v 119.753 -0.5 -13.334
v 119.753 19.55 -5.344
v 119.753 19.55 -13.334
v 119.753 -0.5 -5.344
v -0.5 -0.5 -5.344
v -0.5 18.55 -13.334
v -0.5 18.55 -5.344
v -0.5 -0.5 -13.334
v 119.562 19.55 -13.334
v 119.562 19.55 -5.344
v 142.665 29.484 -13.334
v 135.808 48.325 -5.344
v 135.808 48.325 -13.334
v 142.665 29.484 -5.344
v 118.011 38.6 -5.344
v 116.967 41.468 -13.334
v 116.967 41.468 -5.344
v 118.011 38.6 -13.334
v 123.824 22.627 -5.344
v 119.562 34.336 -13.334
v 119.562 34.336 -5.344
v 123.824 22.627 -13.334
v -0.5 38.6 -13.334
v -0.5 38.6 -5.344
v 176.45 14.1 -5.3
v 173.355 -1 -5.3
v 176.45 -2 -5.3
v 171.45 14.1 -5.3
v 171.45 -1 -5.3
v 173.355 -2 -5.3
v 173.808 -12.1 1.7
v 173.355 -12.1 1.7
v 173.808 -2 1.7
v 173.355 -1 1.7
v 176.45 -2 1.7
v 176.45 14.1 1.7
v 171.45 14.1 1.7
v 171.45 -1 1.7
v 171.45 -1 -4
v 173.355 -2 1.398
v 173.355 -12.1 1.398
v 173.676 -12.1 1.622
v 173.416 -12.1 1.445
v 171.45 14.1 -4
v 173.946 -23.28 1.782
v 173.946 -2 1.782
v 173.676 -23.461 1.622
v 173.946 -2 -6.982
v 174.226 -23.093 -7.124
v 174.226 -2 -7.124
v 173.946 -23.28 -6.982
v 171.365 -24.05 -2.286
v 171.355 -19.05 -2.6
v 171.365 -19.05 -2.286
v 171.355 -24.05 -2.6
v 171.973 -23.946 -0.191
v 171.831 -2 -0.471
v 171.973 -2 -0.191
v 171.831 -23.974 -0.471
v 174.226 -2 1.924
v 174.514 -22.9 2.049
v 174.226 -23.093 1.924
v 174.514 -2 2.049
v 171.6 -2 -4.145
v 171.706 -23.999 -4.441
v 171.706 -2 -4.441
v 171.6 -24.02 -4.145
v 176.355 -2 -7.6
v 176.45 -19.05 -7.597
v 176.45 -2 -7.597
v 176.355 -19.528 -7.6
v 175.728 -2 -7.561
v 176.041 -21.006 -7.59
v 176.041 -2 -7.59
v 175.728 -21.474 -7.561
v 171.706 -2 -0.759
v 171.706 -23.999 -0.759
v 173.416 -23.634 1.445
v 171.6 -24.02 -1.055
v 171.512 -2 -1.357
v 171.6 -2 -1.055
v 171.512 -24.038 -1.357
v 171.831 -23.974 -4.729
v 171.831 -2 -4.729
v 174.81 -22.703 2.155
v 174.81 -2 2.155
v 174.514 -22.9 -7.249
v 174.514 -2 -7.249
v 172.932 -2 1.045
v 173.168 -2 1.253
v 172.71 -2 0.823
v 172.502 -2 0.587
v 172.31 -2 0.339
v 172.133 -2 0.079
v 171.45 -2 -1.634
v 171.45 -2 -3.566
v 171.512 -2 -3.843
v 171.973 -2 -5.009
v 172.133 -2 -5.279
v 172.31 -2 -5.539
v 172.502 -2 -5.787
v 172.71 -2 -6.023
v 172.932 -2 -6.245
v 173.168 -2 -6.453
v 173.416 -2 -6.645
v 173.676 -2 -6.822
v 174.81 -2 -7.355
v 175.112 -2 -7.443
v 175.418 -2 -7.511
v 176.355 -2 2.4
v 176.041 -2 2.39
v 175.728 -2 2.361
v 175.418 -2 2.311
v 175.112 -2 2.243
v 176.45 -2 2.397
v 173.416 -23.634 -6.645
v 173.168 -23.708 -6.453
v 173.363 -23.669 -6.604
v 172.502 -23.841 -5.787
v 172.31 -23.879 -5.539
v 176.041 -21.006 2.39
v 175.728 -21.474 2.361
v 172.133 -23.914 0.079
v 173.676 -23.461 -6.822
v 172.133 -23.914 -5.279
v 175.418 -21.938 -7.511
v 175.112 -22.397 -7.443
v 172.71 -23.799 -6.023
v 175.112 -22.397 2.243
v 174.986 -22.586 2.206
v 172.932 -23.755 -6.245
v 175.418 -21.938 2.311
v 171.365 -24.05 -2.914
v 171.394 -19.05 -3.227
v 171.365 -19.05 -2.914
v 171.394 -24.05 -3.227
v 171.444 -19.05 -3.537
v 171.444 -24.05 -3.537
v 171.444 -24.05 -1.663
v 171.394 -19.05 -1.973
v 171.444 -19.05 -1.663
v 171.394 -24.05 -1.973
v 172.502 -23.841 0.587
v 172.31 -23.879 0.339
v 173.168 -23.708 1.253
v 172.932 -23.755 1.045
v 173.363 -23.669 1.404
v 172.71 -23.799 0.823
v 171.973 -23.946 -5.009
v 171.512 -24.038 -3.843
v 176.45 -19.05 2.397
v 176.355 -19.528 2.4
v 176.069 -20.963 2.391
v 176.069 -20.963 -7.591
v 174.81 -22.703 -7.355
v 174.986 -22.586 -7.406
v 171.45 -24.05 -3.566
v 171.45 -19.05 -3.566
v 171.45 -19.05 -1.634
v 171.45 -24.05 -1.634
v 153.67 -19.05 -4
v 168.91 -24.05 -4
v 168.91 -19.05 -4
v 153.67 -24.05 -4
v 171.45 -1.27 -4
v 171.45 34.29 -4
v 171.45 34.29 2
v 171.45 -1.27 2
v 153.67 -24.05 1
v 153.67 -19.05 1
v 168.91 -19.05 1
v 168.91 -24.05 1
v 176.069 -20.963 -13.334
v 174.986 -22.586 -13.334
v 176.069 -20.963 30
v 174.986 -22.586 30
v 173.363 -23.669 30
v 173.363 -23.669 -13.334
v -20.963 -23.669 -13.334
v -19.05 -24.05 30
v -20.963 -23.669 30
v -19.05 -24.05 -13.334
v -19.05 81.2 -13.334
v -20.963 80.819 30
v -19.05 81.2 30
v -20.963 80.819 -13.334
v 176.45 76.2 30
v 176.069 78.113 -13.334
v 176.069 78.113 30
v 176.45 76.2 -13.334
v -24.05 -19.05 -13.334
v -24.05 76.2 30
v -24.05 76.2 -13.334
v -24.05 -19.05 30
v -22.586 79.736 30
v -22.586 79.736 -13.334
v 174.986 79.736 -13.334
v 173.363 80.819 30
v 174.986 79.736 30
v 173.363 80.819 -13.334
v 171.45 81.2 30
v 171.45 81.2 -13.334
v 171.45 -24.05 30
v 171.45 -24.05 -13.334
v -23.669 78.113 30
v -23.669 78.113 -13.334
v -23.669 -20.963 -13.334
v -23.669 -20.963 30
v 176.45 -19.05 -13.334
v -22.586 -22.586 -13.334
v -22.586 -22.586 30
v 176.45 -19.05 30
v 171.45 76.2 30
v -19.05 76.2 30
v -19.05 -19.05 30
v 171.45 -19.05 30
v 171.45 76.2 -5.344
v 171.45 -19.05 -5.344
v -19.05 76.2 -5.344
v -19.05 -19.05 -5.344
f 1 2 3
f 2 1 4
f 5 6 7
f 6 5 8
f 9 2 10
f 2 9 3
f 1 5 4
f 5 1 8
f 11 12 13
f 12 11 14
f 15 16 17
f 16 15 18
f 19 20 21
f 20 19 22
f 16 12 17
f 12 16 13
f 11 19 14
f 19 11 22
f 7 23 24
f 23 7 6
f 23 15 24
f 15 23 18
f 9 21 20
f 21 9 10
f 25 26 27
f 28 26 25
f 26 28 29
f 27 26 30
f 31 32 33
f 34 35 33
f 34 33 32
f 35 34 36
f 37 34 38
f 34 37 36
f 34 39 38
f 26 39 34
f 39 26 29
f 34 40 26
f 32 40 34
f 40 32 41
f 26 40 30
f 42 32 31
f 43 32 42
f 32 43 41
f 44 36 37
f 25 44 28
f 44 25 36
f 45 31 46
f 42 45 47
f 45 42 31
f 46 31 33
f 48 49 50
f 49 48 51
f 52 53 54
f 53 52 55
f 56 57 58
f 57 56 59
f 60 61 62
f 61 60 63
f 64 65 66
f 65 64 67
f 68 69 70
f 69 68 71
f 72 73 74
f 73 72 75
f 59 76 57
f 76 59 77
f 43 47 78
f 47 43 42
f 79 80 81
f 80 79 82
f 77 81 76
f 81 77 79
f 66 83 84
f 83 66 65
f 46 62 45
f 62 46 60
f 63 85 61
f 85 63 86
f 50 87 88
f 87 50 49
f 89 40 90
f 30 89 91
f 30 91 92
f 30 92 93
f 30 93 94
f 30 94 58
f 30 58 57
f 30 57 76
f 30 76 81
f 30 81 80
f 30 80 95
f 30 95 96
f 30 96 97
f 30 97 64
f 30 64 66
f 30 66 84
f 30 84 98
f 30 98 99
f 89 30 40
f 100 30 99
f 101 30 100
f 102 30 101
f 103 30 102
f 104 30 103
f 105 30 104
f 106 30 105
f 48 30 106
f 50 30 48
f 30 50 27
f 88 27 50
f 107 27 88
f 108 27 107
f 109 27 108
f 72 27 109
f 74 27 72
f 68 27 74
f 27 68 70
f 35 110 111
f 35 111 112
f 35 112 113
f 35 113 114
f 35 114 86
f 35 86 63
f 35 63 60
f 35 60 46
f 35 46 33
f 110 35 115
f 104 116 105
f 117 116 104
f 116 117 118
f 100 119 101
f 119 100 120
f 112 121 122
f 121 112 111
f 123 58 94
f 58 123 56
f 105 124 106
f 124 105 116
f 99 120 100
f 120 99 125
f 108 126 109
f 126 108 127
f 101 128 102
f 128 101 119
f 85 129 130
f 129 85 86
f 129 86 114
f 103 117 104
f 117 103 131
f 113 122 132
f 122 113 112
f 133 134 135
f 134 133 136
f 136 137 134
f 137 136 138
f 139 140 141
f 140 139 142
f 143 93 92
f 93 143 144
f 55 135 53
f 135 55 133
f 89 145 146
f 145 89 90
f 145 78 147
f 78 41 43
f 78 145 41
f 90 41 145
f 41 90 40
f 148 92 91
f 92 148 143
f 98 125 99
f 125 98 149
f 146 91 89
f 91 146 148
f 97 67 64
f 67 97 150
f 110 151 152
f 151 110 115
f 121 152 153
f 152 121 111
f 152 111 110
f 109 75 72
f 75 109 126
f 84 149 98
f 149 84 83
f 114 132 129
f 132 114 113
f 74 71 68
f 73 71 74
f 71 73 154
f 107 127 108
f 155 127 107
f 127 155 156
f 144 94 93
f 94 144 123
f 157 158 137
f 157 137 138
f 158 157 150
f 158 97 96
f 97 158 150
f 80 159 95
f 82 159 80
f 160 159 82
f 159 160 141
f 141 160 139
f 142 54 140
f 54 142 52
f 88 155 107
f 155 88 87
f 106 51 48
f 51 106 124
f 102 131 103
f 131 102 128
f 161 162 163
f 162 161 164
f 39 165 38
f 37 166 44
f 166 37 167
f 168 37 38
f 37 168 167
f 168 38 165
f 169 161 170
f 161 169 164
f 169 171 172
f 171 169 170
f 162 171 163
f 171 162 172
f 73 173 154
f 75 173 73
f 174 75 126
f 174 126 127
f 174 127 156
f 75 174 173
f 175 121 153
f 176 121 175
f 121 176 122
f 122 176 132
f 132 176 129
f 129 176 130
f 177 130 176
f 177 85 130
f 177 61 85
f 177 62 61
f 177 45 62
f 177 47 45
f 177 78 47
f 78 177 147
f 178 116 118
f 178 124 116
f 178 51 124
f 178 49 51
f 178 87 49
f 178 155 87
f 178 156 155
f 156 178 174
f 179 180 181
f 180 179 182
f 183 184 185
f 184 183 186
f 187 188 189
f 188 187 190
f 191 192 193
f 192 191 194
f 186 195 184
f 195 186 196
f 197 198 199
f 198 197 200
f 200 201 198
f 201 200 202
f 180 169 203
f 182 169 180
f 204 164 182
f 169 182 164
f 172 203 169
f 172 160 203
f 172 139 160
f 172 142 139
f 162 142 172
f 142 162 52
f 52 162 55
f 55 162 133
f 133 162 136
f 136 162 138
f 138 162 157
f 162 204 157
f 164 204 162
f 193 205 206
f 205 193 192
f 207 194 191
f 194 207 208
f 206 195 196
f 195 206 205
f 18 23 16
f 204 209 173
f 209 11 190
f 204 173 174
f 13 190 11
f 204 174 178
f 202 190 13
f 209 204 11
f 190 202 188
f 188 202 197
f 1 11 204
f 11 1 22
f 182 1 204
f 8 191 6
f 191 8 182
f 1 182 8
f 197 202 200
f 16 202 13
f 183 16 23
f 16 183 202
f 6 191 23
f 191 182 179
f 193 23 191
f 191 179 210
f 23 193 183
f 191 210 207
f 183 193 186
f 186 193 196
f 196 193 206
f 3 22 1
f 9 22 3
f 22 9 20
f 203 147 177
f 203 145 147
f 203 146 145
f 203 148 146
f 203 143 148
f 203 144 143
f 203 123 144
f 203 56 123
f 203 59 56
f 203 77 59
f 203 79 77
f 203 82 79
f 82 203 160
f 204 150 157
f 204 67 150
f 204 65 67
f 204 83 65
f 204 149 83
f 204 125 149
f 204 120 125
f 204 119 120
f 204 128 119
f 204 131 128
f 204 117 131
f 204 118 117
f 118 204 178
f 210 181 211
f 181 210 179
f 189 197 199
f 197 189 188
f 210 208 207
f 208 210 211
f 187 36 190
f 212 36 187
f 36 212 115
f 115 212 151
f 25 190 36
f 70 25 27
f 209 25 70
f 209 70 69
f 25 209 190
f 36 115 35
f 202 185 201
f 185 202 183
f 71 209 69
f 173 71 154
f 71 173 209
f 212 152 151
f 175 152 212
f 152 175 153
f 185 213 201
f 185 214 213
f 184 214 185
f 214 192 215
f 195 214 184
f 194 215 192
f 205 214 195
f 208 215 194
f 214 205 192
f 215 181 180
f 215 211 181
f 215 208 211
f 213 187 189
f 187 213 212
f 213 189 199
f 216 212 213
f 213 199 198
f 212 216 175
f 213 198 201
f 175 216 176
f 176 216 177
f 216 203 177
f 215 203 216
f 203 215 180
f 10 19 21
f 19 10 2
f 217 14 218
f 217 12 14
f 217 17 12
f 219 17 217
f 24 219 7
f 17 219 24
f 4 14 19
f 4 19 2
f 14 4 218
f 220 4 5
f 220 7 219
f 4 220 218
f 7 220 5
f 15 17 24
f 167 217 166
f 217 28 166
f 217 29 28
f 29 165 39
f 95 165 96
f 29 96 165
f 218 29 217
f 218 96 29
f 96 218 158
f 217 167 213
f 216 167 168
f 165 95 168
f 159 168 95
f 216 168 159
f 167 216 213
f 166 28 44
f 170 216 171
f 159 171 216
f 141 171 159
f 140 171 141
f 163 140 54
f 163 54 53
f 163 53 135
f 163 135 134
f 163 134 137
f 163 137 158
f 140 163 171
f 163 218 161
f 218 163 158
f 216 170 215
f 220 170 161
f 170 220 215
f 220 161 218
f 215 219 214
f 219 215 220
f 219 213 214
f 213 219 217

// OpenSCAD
// file: ../../../lib/circuits/helpers.scad
function bu(u) = u * 2.54;

module breadboard_row(number, orientation="vertical") {
  children();
  if(number > 1) {
    if(orientation == "vertical") {
      translate([0,bu(1),0])
        breadboard_row(number-1, orientation=orientation) {
          children();
        }
    } else {
      translate([bu(1),0,0])
        breadboard_row(number-1, orientation=orientation){
          children();
        }
    }
  }
}
// file: ../../../lib/switches/rgb.scad
include <../variables.scad>

module rgb_row_trace_connection(width, height, xpos, ypos, rgb, connections) {
  half_width = u_mm(width)/2;
  half_height = u_mm(height)/2;
  if(connections[3] == "connect") {
    translate([1-half_width,8.875,0]){
      circle(d=0.8,$fn=40);
      offset(0.4)
        polygon(points=[[0,-0.01],[0,0.01],[u_mm(-xpos)-2, u_mm(-ypos)+0.01],[u_mm(-xpos)-2, u_mm(-ypos)-0.01]]);
    }
    translate([1-half_width,4.9,0]){
      circle(d=0.8,$fn=40);
      offset(0.4)
        polygon(points=[[0,-0.01],[0,0.01],[u_mm(-xpos)-2, u_mm(-ypos)+0.01],[u_mm(-xpos)-2, u_mm(-ypos)-0.01]]);
    }
    translate([1-half_width,3.3,0]){
      circle(d=0.8,$fn=40);
      offset(0.4)
        polygon(points=[[0,-0.01],[0,0.01],[u_mm(-xpos)-2, u_mm(-ypos)+0.01],[u_mm(-xpos)-2, u_mm(-ypos)-0.01]]);
    }
  }
  if(connections[2] == "connect") {
    translate([half_width-1,8.875,0]) {
      circle(d=0.8,$fn=40);
    }
    translate([half_width-1,4.9,0]) {
      circle(d=0.8,$fn=40);
    }
    translate([half_width-1,3.3,0]){
      circle(d=0.8,$fn=40);
    }
  }
}

module rgb_pcb_drill(width=1, height=1, rgb=true, connections=["hole","hole","hole","hole"]) {
  half_width = u_mm(width)/2;
  half_height = u_mm(height)/2;
  translate([half_width,half_height,0]) {
    if(rgb == true) {
      // LED Hole
      translate([-1.875,3.4])
        square([3.75,3]);

      // LED D
      if(connections[3] == "hole")
        translate([1.3-half_width,8,0])
          circle(d=1,$fn=40);
      if(connections[2] == "hole")
        translate([half_width-1.3,8,0])
          circle(d=1,$fn=40);

      // LED G
      if(connections[3] == "hole")
        translate([1.3-half_width,5.4,0])
          circle(d=1,$fn=40);
      if(connections[2] == "hole")
        translate([half_width-1.3,5.4,0])
          circle(d=1,$fn=40);

      // LED V
      if(connections[3] == "hole")
        translate([1.3-half_width,2.8,0])
          circle(d=1,$fn=40);
      if(connections[2] == "hole")
        translate([half_width-1.3,2.8,0])
          circle(d=1,$fn=40);
    }

    children();
  }
}

module rgb_pcb_hole_traces(width=1, height=1, rgb=true, xpos=0, ypos=0, connections=["hole","hole","hole","hole"]) {
  half_width = u_mm(width)/2;
  half_height = u_mm(height)/2;
  translate([half_width,half_height,0]) {
    if(rgb == true) {
      // LED D
      if(connections[3] == "hole")
        translate([1.3-half_width,8,0])
          circle(d=2.5,$fn=40);
      if(connections[2] == "hole")
        translate([half_width-1.3,8,0])
          circle(d=2.5,$fn=40);

      // LED G
      if(connections[3] == "hole")
        translate([1.3-half_width,5.4,0])
          circle(d=2.5,$fn=40);
      if(connections[2] == "hole")
        translate([half_width-1.3,5.4,0])
          circle(d=2.5,$fn=40);

      // LED V
      if(connections[3] == "hole")
        translate([1.3-half_width,2.8,0])
          circle(d=2.5,$fn=40);
      if(connections[2] == "hole")
        translate([half_width-1.3,2.8,0])
          circle(d=2.5,$fn=40);
    }

    children();
  }
}

module rgb_pcb_traces(width=1, height=1, rgb=true, xpos=0, ypos=0, connections=["hole","hole","hole","hole"]) {
  half_width = u_mm(width)/2;
  half_height = u_mm(height)/2;
  rgb_pcb_hole_traces(width=width, height=height, rgb=rgb, connections=connections) {
    if(rgb == true) {
      rgb_row_trace_connection(width=width, height=height, xpos=xpos, ypos=ypos, rgb=rgb, connections=connections);
      v_left = connections[3] == "none" ? 1 : half_width-5;
      // LED G
      translate([1.25,5])
        square([2,2]);
      translate([2.7,8.5,0]) {
        length = connections[2] == "none" ? 2 : half_width-3.7; 
        square([length,0.75]);
      }
      translate([2.7,6.8])
        square([0.8,2.4]);
      translate([-3.5,6.2])
        square([7,0.8]);
      translate([-3.5,6.8])
        square([0.8,2.4]);
      translate([-4-v_left,8.5,0])
        square([v_left+1,0.75]);

      // LED D
      translate([-4-v_left,4.5,0])
        square([v_left,0.8]);
      translate([-4.5,4.5,0])
        square([0.8,1.3]);
      translate([-4.5,5,0])
        square([1.3,0.8]);
      translate([2,4,0])
        square([2,0.8]);
      translate([4,4,0])
        square([0.8,1.3]);
      translate([4,4.5,0]) {
        length = connections[2] == "none" ? 0 : half_width-5; 
        square([length,0.75]);
      }
      translate([-3.375,5])
        square([2,1.1]);
      translate([1.25,3.75])
        square([2,1.1]);

      // LED V
      v_right = connections[2] == "none" ? 0 : half_width-5.25;
      translate([-4-v_left,2.9,0])
        square([v_right+v_left+8.875,0.8]);
      translate([-3.375,3.5])
        square([2,1.35]);
    }

    children();
  }
}
// file: ../../../lib/switches/base.scad
include <../variables.scad>
include <rgb.scad>

// ["top", "bottom", "left", "right"]

module switch_row_trace_connection(width, height, xpos, ypos, rgb, connections) {
  half_width = u_mm(width)/2;
  half_height = u_mm(height)/2;
  if(connections[3] == "connect") {
    translate([1-half_width,-5.5,0]){
      circle(d=0.8,$fn=40);
      offset(0.4)
        polygon(points=[[0,-0.01],[0,0.01],[u_mm(-xpos)-2, u_mm(-ypos)+0.01],[u_mm(-xpos)-2, u_mm(-ypos)-0.01]]);
    }
  }
  if(connections[2] == "connect") {
    translate([half_width-1,-5.5,0]) {
      circle(d=0.8,$fn=40);
    }
  }
}

module switch_column_trace_connection(width, height, xpos, ypos, rgb, connections, last_xpos=0, last_ypos=0) {
  half_width = u_mm(width)/2;
  half_height = u_mm(height)/2;
  if(connections[1] == "connect") {
    translate([-u_mm((width-1)/2)-0.9,half_height-1,0]) {
      circle(d=0.8,$fn=40);
      offset(0.4)
        polygon(points=[[0,-0.01],[0,0.01],[u_mm((width-1)/2),0.01],[u_mm((width-1)/2),-0.01]]);
    }
  }
  if(connections[0] == "connect") {
    y_off = u_mm(ypos-last_ypos);
    x_off = u_mm(last_xpos-xpos);
    translate([-0.875,-1-y_off-half_height,0]) {
      offset(0.4)
        polygon(points=[[-0.01+x_off,0],[0.01+x_off,0],[0.01,2+y_off],[-0.01,2+y_off]]);
      translate([x_off-0.01,0]) {
        offset(0.4)
          polygon(points=[[0,-0.01],[0,0.01],[u_mm((width-1)/2)+1,0.01],[u_mm((width-1)/2)+1,-0.01]]);
      }
    }
  }
}

module switch_base_pcb_drill(width=1, height=1, rgb=true, single=true, connections=["hole","hole","hole","hole"]) {
  half_width = u_mm(width)/2;
  half_height = u_mm(height)/2;
  rgb_pcb_drill(width=width, height=height, rgb=rgb, connections=connections) {
    // Row
    if(connections[2] == "hole")
      translate([half_width-1.3,-5.5,0])
        circle(d=1,$fn=40);
    if(connections[3] == "hole")
      translate([1.3-half_width,-5.5,0])
        circle(d=1,$fn=40);

    // Column
    if(connections[1] == "hole")
      translate([-1,half_height-1.25,0])
        circle(d=1,$fn=40);
    if(connections[0] == "hole")
      translate([-1,1.25-half_height,0])
        circle(d=1,$fn=40);

    children();
  }
}

module switch_base_pcb_traces(width=1, height=1, rgb=true, xpos=0, ypos=0, connections=["hole","hole","hole","hole"], last_xpos=0, last_ypos=0, single=true) {
  half_width = u_mm(width)/2;
  half_height = u_mm(height)/2;
  rgb_pcb_traces(width=width, height=height, rgb=rgb, xpos=xpos, ypos=ypos, connections=connections) {
    switch_row_trace_connection(width, height, xpos, ypos, rgb, connections);
    if(single && !rgb)
      switch_column_trace_connection(width, height, xpos, ypos, rgb, connections, last_xpos=last_xpos, last_ypos=last_ypos);

    // Row
    if(connections[2] == "hole")
      translate([half_width-1.3,-5.5,0])
        circle(d=2.5,$fn=40);
    if(connections[3] == "hole")
      translate([1.3-half_width,-5.5,0])
        circle(d=2.5,$fn=40);

    // Column
    if(connections[1] == "hole")
      translate([-1,half_height-1.25,0])
        circle(d=2.4,$fn=40);
    if(connections[0] == "hole")
      translate([-1,1.25-half_height,0])
        circle(d=2.4,$fn=40);

    children();
  }
}

module switch_base_pcb_traces_bottom(width=1, height=1, rgb=true, xpos=0, ypos=0, connections=["hole","hole","hole","hole"], last_xpos=0, last_ypos=0) {
  half_width = u_mm(width)/2;
  half_height = u_mm(height)/2;
  rgb_pcb_hole_traces(width=width, height=height, rgb=rgb, connections=connections) {
    switch_column_trace_connection(width, height, xpos, ypos, rgb, connections, last_xpos=last_xpos, last_ypos=last_ypos);

    // Row
    if(connections[2] == "hole")
      translate([half_width-1.3,-5.5,0])
        circle(d=2.5,$fn=40);
    if(connections[3] == "hole")
      translate([1.3-half_width,-5.5,0])
        circle(d=2.5,$fn=40);

    // Column
    if(connections[1] == "hole")
      translate([-1,half_height-1.25,0])
        circle(d=2.5,$fn=40);
    if(connections[0] == "hole")
      translate([-1,1.25-half_height,0])
        circle(d=2.5,$fn=40);

    children();
  }
}
// file: ../../../lib/switches/footprints.scad
include <../variables.scad>
include <stabilizers.scad>

module pcb_switch_outline(width=1, height=1) {
  stab_extra = width >= 2 ? 2 : 0;
  translate([0,-stab_extra])
    square([u_mm(width)+0.01, u_mm(height)+0.01+stab_extra]);
}

module pcb_switch_space_outline(width=1, height=1, style="mx", cnc=false) {
  offset = height_for_style(style);
  stab_extra = width >= 2 ? 2 : 0;
  translate([-1,-1-stab_extra,2.834-offset])
    cube([u_mm(width) + 2, u_mm(height) + 2 + stab_extra, 1.166+offset]);
  translate([u_mm(width/2),u_mm(height/2)]) {
    translate([-7.5,-7.5,1.5-offset])
      cube([15,15,5]);
    translate([-7,-7,-10])
      cube([14,14,10]);
    translate([u_mm(-width/2)-0.5,u_mm(-height/2)-0.5,-20-offset])
      cube([u_mm(width)+1,u_mm(height)+1, 20]);
  }
  translate([hole_offset(width), hole_offset(height),-10])
    stab(width);
}
// file: ../../../lib/switches/stabilizers.scad
module stab_hole_render(distance){
  translate([14+distance+3.375,6.99,0]) {
    circle(d=3.175, $fn=40);
    translate([0,-15.24,0])
      circle(d=4.064, $fn=40);
  }
  translate([-6.75-distance+3.375,6.99,0]) {
    circle(d=3.175, $fn=40);
    translate([0,-15.24,0])
      circle(d=4.064, $fn=40);
  }
}

module stab_holes(width) {
  if (width >= 7) {
    stab_hole_render(39.6);
  } else if (width >= 6) {
    stab_hole_render(39.6);
  } else if(width >= 2) {
    stab_hole_render(1.6);
  }
}

module stab_render(distance, cnc=false, height=5.334) {
  translate([14+distance,1.47,0]){
    // Right Side Large Hole
    cube([6.75,12.3,10]);

    // Add 1/16" corner holes for milling
    if(cnc){
      translate([0.56,0.56,0])
        cylinder(h=10,d=1.59,$fn=20);
      translate([6.75-0.56,0.56,0])
        cylinder(h=10,d=1.59,$fn=20);
      translate([0.56,12.3-0.56,0])
        cylinder(h=10,d=1.59,$fn=20);
      translate([6.75-0.56,12.3-0.56,0])
        cylinder(h=10,d=1.59,$fn=20);
    }
    translate([5.75,3.23,0]){
      // Side hole for notch
      cube([1.825,3.175,10]);
      translate([1.825,1.59,0])
        if(cnc)
          resize([1.59,3.175,10])
            cylinder(h=10,d=1.59,$fn=20);
    }
    translate([1.725,11.3,0]){
      // Top Notch
      cube([3.3,2.2,10]);
      if(cnc)
        translate([1.65,2.2,0])
          resize([3.3,1,10])
            cylinder(h=10,d=1,$fn=20);
    }
    // Thin out for clip
    translate([-1,-1,10-height+1.5])
      cube([8.75,14.3,height-1.5]);
  }
  translate([-6.75-distance,1.47,0]){
    // Left Side Large Hole
    cube([6.75,12.3,10]);
    translate([-0.825,3.23,0]){
      // Side hole for notch
      cube([1.825,3.175,10]);
      if(cnc)
        translate([0,1.59,0])
          resize([1.59,3.175,10])
            cylinder(h=10,d=1.59,$fn=20);

    }
    translate([1.725,11.3,0]){
      // Top Notch
      cube([3.3,2.2,10]);
      if(cnc)
        translate([1.65,2.2,0])
          resize([3.3,1,10])
            cylinder(h=10,d=1,$fn=20);
    }
    if(cnc){
      translate([0.56,0.56,0])
        cylinder(h=10,d=1.59,$fn=20);
      translate([6.75-0.56,0.56,0])
        cylinder(h=10,d=1.59,$fn=20);
      translate([0.56,12.3-0.56,0])
        cylinder(h=10,d=1.59,$fn=20);
      translate([6.75-0.56,12.3-0.56,0])
        cylinder(h=10,d=1.59,$fn=20);
    }
    // Thin out for clip
    translate([-1,-1,10-height+1.5])
      cube([8.75,14.3,height-1.5]);
  }
  // Center shaft for bar
  translate([-distance-2,4.7,0]){
    cube([distance*2+20,4.6,10]);
  }
}

module stab(key_width, cnc=false) {
  if (key_width >= 7) {
    stab_render(39.6, cnc=cnc);
  } else if (key_width >= 6) {
    stab_render(39.6, cnc=cnc);
  } else if(key_width >= 2) {
    stab_render(1.6, cnc=cnc);
  }
}
// file: ../../../lib/circuits/wire.scad
module guage(guage=12) {
  fn=20;
  if(guage == 8) {
    circle(d=3.25, $fn=fn);
  } else if (guage == 10) {
    circle(d=2.59, $fn=fn);
  } else if (guage == 12) {
    circle(d=2.06, $fn=fn);
  } else if (guage == 14) {
    circle(d=1.57, $fn=fn);
  } else if (guage == 16) {
    circle(d=1.3, $fn=fn);
  }
}

module wire_pcb_drill(guage=12) {
  offset(0.1)
    guage(guage);
}

module wire_pcb_traces(guage=12) {
  offset(0.75)
    guage(guage);
}

module wire_pcb_outline(guage=12) {
  offset(1.5)
    guage(guage);
}

module wire_space_outline(guage=12) {
  linear_extrude(10)
    offset(0.1)
      guage(guage);
}
// file: ../../../lib/circuits/trrs.scad
module trrs_post(d=1.2) {
  translate([0,-d/4,0]) {
    circle(d=d, $fn=20);
    translate([-d/2,0,0]) {
      square([d,(d/2-.2)]);
    }
    translate([0,(d/2-.2),0]) {
      circle(d=d, $fn=20);
    }
  }
}

module trrs_pcb_drill(side="left") {
  translate([2.8,1.5]) {
    circle(d=2, $fn=20);
  }
  translate([2.8,8.5]) {
    circle(d=2, $fn=20);
  }
  translate([0.5,11.3,0]) {
    trrs_post();
  }
  translate([5.1,3.2,0]) {
    trrs_post();
  }
  translate([5.1,6.2,0]) {
    trrs_post();
  }
  translate([5.1,10.2,0]) {
    trrs_post();
  }
  if(side != "none"){
    offset = side == "left" ? 7.6 : -2;
    translate([offset,11.3]) {
      circle(d=1.2, $fn=20);
    }
    translate([offset,8.3]) {
      circle(d=1.2, $fn=20);
    }
    translate([offset,5.3]) {
      circle(d=1.2, $fn=20);
    }
    translate([offset,2.2]) {
      circle(d=1.2, $fn=20);
    }
  }
}

module trrs_pcb_traces(side="left") {
  translate([-1,9.7,0]){
    difference() {
      square([3,3]);
      if(side == "right") {
        translate([3,-1.8]) {
          rotate(45) {
            square(2);
          }
        }
      }
    }
  }
  translate([3.6,1.2,0]){
    difference() {
      square([3,3.5]);
      if(side == "left") {
        translate([3,2.3]) {
          rotate(45) {
            square(2);
          }
        }
      }
    }
  }
  translate([3.6,4.8,0]){
    difference() {
        square([3,3.5]);
        if(side == "left") {
          translate([3,2.3]) {
            rotate(45) {
              square(2);
            }
          }
        }
    }
  }
  translate([3.6,8.4,0]){
    difference() {
      square([3,3.2]);
      if(side == "left") {
        translate([3,1.8]) {
          rotate(45) {
            square(2);
          }
        }
      }
    }
  }
  if(side != "none"){
    translate([side == "left" ? 7.6 : -2,0,0]){
      translate([0,11.3]) {
        circle(d=3, $fn=20);
      }
      translate([0,8.3]) {
        circle(d=2.9, $fn=20);
      }
      translate([0,5.3]) {
        circle(d=3, $fn=20);
      }
      translate([0,2.2]) {
        circle(d=3, $fn=20);
      }
    }
    translate([side == "left" ? 5.6 : -2,0,0]){
      left_trace = side == "left" ? 2.5 : 7.6;
      translate([0,2.2]) {
        square([left_trace,1.5]);
      }
      translate([0,5.1]) {
        square([left_trace,1.5]);
      }
      if(side == "left") {
        translate([0,8.7]) {
          square([left_trace,0.9]);
        }
      }
      else {
        translate([0,8]) {
          square([4,1.6]);
        }
        translate([4,9]) {
          square([4,1.6]);
        }
        translate([2.8,9.4]) {
          rotate(-45) {
            square([1,1.7]);
          }
        }
      }
    }
    translate([side == "left" ? 0.5 : -2,0,0]){
      right_trace = side == "left" ? 7.1 : 2;
      translate([0,11.7]) {
        square([right_trace,1.3]);
      }
      translate([0,12]) {
        circle(1, $fn=20);
      }
      translate([right_trace,11.8]) {
        circle(1, $fn=20);
      }
    }
  }
}

module trrs_pcb_outline(side="left") {
  translate([-1,0,0]) {
    square([7.6,13.1]);
  }
  if(side != "none"){
    translate([side == "left" ? 5.6 : -3.5, 0]) {
      square([4,13.1]);
    }
  }
}

module trrs_space_outline(side="left") {
  translate([0,0,-5.3]) {
    linear_extrude(7){
      translate([-2,-1,0])
        square([9.6,15.1]);
      translate([0,-12.1,0])
        square([5.6,12.1]);
      if(side != "none")
        translate([side == "left" ? 5.6 : -4.5, -1])
          square([5,15.1]);
    }
  }
  translate([3,-2,-2.6]) {
    rotate([90,0,0]) {
      cylinder(d=10, h=30, $fn=100);
    }
  }
}
// file: ../../../lib/circuits/trace.scad
function vdef(vector, index) = len(vector) == index ? vector[index-1] : vector[index];
function vadd(vector, index, axis) = vdef(vector, index)[axis] > vdef(vector, index-1)[axis] ? 0.01 : -0.01;
function polygon_from_vector(vector) = 
  len(vector) > 0 ?
    concat(vector, 
      [for (i = [1:len(vector)]) 
        [vector[len(vector)-i][0]-vadd(vector, i, 0),vector[len(vector)-i][1]-vadd(vector, i, 1)]])
      : [];

function parse_loc(loc) = [
  loc[5],
  len(loc) < 7 ? "both" : loc[6],
  len(loc) < 8 ? "none" : loc[7],
];

module manual_trace_pcb_drill(location) {
  vector = parse_loc(location)[0];
  echo("holes", parse_loc(location)[2]);
  if(parse_loc(location)[2] == "holes" || parse_loc(location)[2] == "hole_begin") {
    translate(vector[0]) {
      circle(d=1, $fn=20);
    }
  }
  if(parse_loc(location)[2] == "holes" || parse_loc(location)[2] == "hole_end") {
    translate(vector[len(vector)-1]) {
      circle(d=1, $fn=20);
    }
  }
}

module manual_trace_pcb_traces(location) {
  vector = parse_loc(location)[0];
  if(parse_loc(location)[1] != "bottom") {
    offset(0.4) {
      polygon(points=polygon_from_vector(vector));
    }
  }
  if(parse_loc(location)[2] == "holes" || parse_loc(location)[2] == "hole_begin") {
    translate(vector[0]) {
      circle(d=2.5, $fn=20);
    }
  }
  if(parse_loc(location)[2] == "holes" || parse_loc(location)[2] == "hole_end") {
    translate(vector[len(vector)-1]) {
      circle(d=2.5, $fn=20);
    }
  }
}

module manual_trace_pcb_traces_bottom(location) {
  vector = parse_loc(location)[0];
  if(parse_loc(location)[1] != "top") {
    offset(0.4) {
      polygon(points=polygon_from_vector(vector));
    }
  }
  if(parse_loc(location)[2] == "holes" || parse_loc(location)[2] == "hole_begin") {
    translate(vector[0]) {
      circle(d=2.5, $fn=20);
    }
  }
  if(parse_loc(location)[2] == "holes" || parse_loc(location)[2] == "hole_end") {
    translate(vector[len(vector)-1]) {
      circle(d=2.5, $fn=20);
    }
  }
}

module manual_trace_pcb_outline(location) {
  vector = parse_loc(location)[0];
  echo("location", location);
  offset(1)
    polygon(points=polygon_from_vector(vector));

  if(parse_loc(location)[2] == "holes" || parse_loc(location)[2] == "hole_begin") {
    translate(vector[0]) {
      circle(d=4, $fn=20);
    }
  }
  if(parse_loc(location)[2] == "holes" || parse_loc(location)[2] == "hole_end") {
    translate(vector[len(vector)-1]) {
      circle(d=4, $fn=20);
    }
  }
}

module manual_trace_space_outline(location) {
  vector = parse_loc(location)[0];
  translate([0,0,-1])
    linear_extrude(2)
      offset(0.5)
        manual_trace_pcb_outline(vector);
}
// file: ../../../lib/circuits/support.scad
module support_pcb_drill(mm=2) {
  offset(0.1)
    circle(d=mm, $fn=20);
}

module support_pcb_traces(mm=2) {
}

module support_pcb_outline(mm=2) {
  offset(2)
    circle(d=mm, $fn=20);
}

module support_space_outline(mm=2) {
  linear_extrude(10)
    offset(0.1)
      circle(d=mm, $fn=20);
}
// file: ../../../lib/circuits/proton_c.scad
use <helpers.scad>

module proton_c_pcb_drill(size="full") {
  translate([bu(0.5),bu(1.5),0]) {
    translate([0,bu(1)])
      breadboard_row(4, "horizontal"){
        circle(d=1, $fn=20);
        translate([0,bu(1)])
          circle(d=1, $fn=20);
      }
    translate([bu(4),bu(1)])
      breadboard_row(2)
        circle(d=1, $fn=20);
    translate([bu(4),bu(3)])
      breadboard_row(2)
        circle(d=1, $fn=20);
    circle(d=1, $fn=20);
    translate([bu(1),0,0])
      circle(d=1, $fn=20);
    translate([bu(5),0,0])
      circle(d=1, $fn=20);
    translate([bu(6),0,0])
      circle(d=1, $fn=20);
    breadboard_row(12) {
      circle(d=1, $fn=20);
      translate([bu(1),0,0])
        circle(d=1, $fn=20);
      translate([bu(5),0,0])
        circle(d=1, $fn=20);
      translate([bu(6),0,0])
        circle(d=1, $fn=20);
    }
    if(size == "full")
      translate([0,bu(13)])
        breadboard_row(6) {
          circle(d=1, $fn=20);
          translate([bu(1),0,0])
            circle(d=1, $fn=20);
          translate([bu(5),0,0])
            circle(d=1, $fn=20);
          translate([bu(6),0,0])
            circle(d=1, $fn=20);
    }
  }
}

module proton_c_pcb_traces(size="full") {
  translate([bu(0.5),bu(1.5),0]) {
    translate([0,bu(1)])
      breadboard_row(4, "horizontal"){
        circle(d=2.4, $fn=20);
        translate([-1,0])
          square([2,bu(1)]);
        translate([0,bu(1)])
          circle(d=2.4, $fn=20);
      }
    translate([0,bu(1)])
      breadboard_row(2) {
        translate([bu(5),0])
          circle(d=2.4, $fn=20);
        translate([bu(5),-1,0])
          square([bu(1),2]);
        translate([bu(6),0,0])
          circle(d=2.4, $fn=20);
      }
    translate([bu(4),bu(1)]){
      translate([-0.75,-1])
        square([1.5,bu(2)-2]);
      breadboard_row(2)
        circle(d=2.4, $fn=20);
      translate([0,-0.75])
        square([bu(2),1.5]);
    }
    translate([bu(4),bu(3)]){
      translate([-0.75,-1])
        square([1.5,bu(2)-2]);
      breadboard_row(2)
        circle(d=2.4, $fn=20);
      translate([0,-0.75])
        square([bu(2),1.5]);
    }
    circle(d=2.4, $fn=20);
    translate([0,-1,0])
      square([bu(1),2]);
    translate([bu(1),0,0])
      circle(d=2.4, $fn=20);
    translate([bu(5),0])
      circle(d=2.4, $fn=20);
    translate([bu(5),-1,0])
      square([bu(1),2]);
    translate([bu(6),0,0])
      circle(d=2.4, $fn=20);
    translate([0,bu(3)])
      breadboard_row(9) {
        circle(d=2.4, $fn=20);
        translate([0,-1,0])
          square([bu(1),2]);
        translate([bu(1),0,0])
          circle(d=2.4, $fn=20);
        translate([bu(5),0])
          circle(d=2.4, $fn=20);
        translate([bu(5),-1,0])
          square([bu(1),2]);
        translate([bu(6),0,0])
          circle(d=2.4, $fn=20);
      }
    if(size == "full")
      translate([0,bu(13)])
        breadboard_row(6) {
          circle(d=2.4, $fn=20);
          translate([0,-1,0])
            square([bu(1),2]);
          translate([bu(1),0,0])
            circle(d=2.4, $fn=20);
          translate([bu(5),0])
            circle(d=2.4, $fn=20);
          translate([bu(5),-1,0])
            square([bu(1),2]);
          translate([bu(6),0,0])
            circle(d=2.4, $fn=20);
        }
  }
}

module proton_c_pcb_outline(size="full") {
  translate([0,bu(1)])
  square([bu(7), bu(size == "full" ? 19 : 12)]);
}

module proton_c_space_outline(size="full") {
  translate([0,0,-4]) {
    linear_extrude(6) {
      translate([-bu(0.5),-bu(0.5)])
        square([bu(8), bu(size == "full" ? 21 : 14)]);
    }
    linear_extrude(5) {
      translate([bu(0.5),-bu(15),0])
        square([bu(6),bu(25)]);
    }
  }
}
// file: ../../../lib/circuits/pro_micro.scad
use <helpers.scad>

module pro_micro_pcb_drill(connections="holes") {
  translate([bu(0.5),bu(1.5),0]) {
    if(connections == "holes"){
      translate([bu(3),bu(1)])
        breadboard_row(3)
          circle(d=1, $fn=20);
      translate([bu(4),bu(3)])
        breadboard_row(3)
          circle(d=1, $fn=20);
    }
    breadboard_row(12) {
      circle(d=1, $fn=20);
      if(connections == "holes") {
        translate([bu(1),0,0])
          circle(d=1, $fn=20);
        translate([bu(5),0,0])
          circle(d=1, $fn=20);
      }
      translate([bu(6),0,0])
        circle(d=1, $fn=20);
    }
  }
}

module pro_micro_pcb_traces(connections="holes") {
  translate([bu(0.5),bu(1.5),0]) {
    // GRND
    if(connections == "holes"){
      translate([bu(3),bu(1)]){
        translate([-0.75,-1])
          square([1.5,bu(3)-2]);
        breadboard_row(3)
          circle(d=2.4, $fn=20);
        translate([0,-0.75])
          square([bu(2),1.5]);
      }
      translate([bu(4),bu(3)]){
        translate([-0.75,-1])
          square([1.5,bu(3)-2]);
        breadboard_row(3)
          circle(d=2.4, $fn=20);
        translate([0,-0.75])
          square([bu(2),1.5]);
      }
    }
    breadboard_row(12) {
      circle(d=2.4, $fn=20);
      if(connections == "holes") {
        translate([0,-1,0])
          square([bu(1),2]);
        translate([bu(1),0,0])
          circle(d=2.4, $fn=20);
        translate([bu(5),0])  
          circle(d=2.4, $fn=20);
        translate([bu(5),-1,0])
          square([bu(1),2]);
      }
      translate([bu(6),0,0])
        circle(d=2.4, $fn=20);
    }
  }
}

module pro_micro_pcb_outline() {
  translate([0,bu(1)])
  square([bu(7), bu(12)]);
}

module pro_micro_space_outline() {
  translate([0,0,-4]) {
    linear_extrude(6) {
      translate([-bu(0.5),-bu(0.5)])
        square([bu(8), bu(14)]);
    }
    linear_extrude(5) {
      translate([bu(0.5),-bu(15),0])
        square([bu(6),bu(25)]);
    }
  }
}
// file: ../../../lib/circuits/mts_101.scad
use <../variables.scad>
module mts_101_pcb_drill() {
  translate([0,1.25]) {
    translate([2.5,0])
      square([3,1]);
    translate([1.25,0.5])
      circle(d=1,$fn=40);
    translate([6.75,0.5])
      circle(d=1,$fn=40);

    translate([2.5,4.75])
      square([3,1]);
    translate([1.25,5.25])
      circle(d=1,$fn=40);
    translate([6.75,5.25])
      circle(d=1,$fn=40);

    translate([4,10])
      circle(d=1,$fn=40);
    translate([1.25,10])
      circle(d=1,$fn=40);
    translate([6.75,10])
      circle(d=1,$fn=40);
  }
}

module mts_101_pcb_traces() {
  translate([0,1.25]) {
    translate([2,-0.5])
      square([4,2]);
    translate([1.25,0.5])
      circle(d=2,$fn=40);
    translate([6.75,0.5])
      circle(d=2,$fn=40);

    translate([2,4.25])
      square([4,2]);
    translate([1.25,5.25])
      circle(d=2,$fn=40);
    translate([6.75,5.25])
      circle(d=2,$fn=40);

    translate([4,10])
      circle(d=2,$fn=40);
    translate([1.25,9.5])
      square([6,1]);
    translate([1.25,10])
      circle(d=2,$fn=40);
    translate([6.75,10])
      circle(d=2,$fn=40);
  }
}

module mts_101_pcb_outline() {
  square([8,13]);
}

module mts_101_space_outline(, cnc=false) {
  translate([-0.5,-0.5,-10])
    cube([9,14, 14.4]);
  translate([4,6.5,-26]) {
    cylinder(d=6, h=18, $fn=30);
    cylinder(d=12, h=10, $fn=60);
  }
}
// file: ../../../lib/circuits/ec11.scad
use <../variables.scad>
use <../switches/base.scad>

module 1u_centered() {
  translate([u_mm(0.5),u_mm(0.5)])
    children();
}

module ec11_pcb_drill(single=false, connections=["hole","hole","hole","hole"]) {
  switch_base_pcb_drill(rgb=false, connections=connections) {
    // Key Column
    translate([-3,0,0])
      circle(d=1,$fn=40);

    // Key Row
    translate([7,2.5])
      circle(d=1, $fn=20);

    if(single) {
      translate([4.25,-3,0])
        circle(d=1, $fn=20);
      translate([-3,-3.25,0])
        circle(d=1,$fn=40);
    }
    translate([4.25,0,0])
      circle(d=1, $fn=20);

    translate([7,-2.5])
      circle(d=1, $fn=20);

    if(connections[3] == "hole"){
      translate([-5.5,2.5])
        circle(d=1, $fn=20);
      translate([-5.5,0])
        circle(d=1, $fn=20);
      translate([-5.5,-2.5])
        circle(d=1, $fn=20);
    }
    translate([-7.5,-2.5])
      circle(d=1, $fn=20);
    translate([-7.5,2.5])
      circle(d=1, $fn=20);
    translate([-7.5,0])
      circle(d=1, $fn=20);

    translate([-1.3,-6.25])
      square([2.6,1.5]);
    translate([-1.3,4.75])
      square([2.6,1.5]);
  }
}

module ec11_pcb_traces(single=false, connections=["hole","hole","hole","hole"]) {
  switch_base_pcb_traces(single=single, rgb=false, connections=connections) {
    // Key Row
    if(single){
      translate([2,2.2])
        square([4.5,0.8]);
      r_len = connections[0] != "none" ? u_mm(0.5)-1 : 6;
      l_len = connections[1] != "none" ? u_mm(0.5)-1 : 6;
      translate([2,-r_len])
        square([0.8,r_len+l_len]);
      if(connections[0] != "none")
        translate([-2,1-u_mm(0.5)])
          square([4,0.8]);
      if(connections[1] != "none")
        translate([-2.1,u_mm(0.5)-1.6])
          square([4.9,0.8]);
    }
    translate([7,2.5])
      circle(d=2.5,$fn=40);

    // Key Column
    if(connections[3] != "none")
      translate([1-u_mm(0.5),-6])
        square([u_mm(0.5)-4,1]);
    translate([-3.25,-6])
      square([0.8,5]);
    translate([-3,0])
      circle(d=2.5,$fn=40);

    if(single){
      translate([-3,-3.25])
        circle(d=2.5,$fn=40);
      translate([4.25,-3])
        circle(d=2.5,$fn=40);
    } else {
      translate([-3,-3.25])
        square([7.8,0.8]);
    }

    translate([7,-2.5])
      circle(d=2.5,$fn=40);
    translate([4.25,0]) {
      circle(d=2.5,$fn=40);
      rotate(-45)
        square([5,0.8]);
    }

    translate([4,-6])
      square([0.8,3]);
    if(connections[2] != "none")
      translate([4,-6])
        square([4.5,0.8]);

    if(connections[3] == "hole"){
      translate([-5.5,2.5])
        circle(d=2.25, $fn=20);
      translate([-5.5,0])
        circle(d=2.25, $fn=20);
      translate([-5.5,-2.5])
        circle(d=2.25, $fn=20);
    }
    translate([-7.5,-2.5])
      circle(d=2.25, $fn=20);
    translate([-7.5,2.5])
      circle(d=2.25, $fn=20);
    translate([-7.5,0])
      circle(d=2.25, $fn=20);
  }
}

module ec11_pcb_traces_bottom(connections=["hole","hole","hole","hole"]) {
  switch_base_pcb_traces_bottom(rgb=false, connections=connections) {
    // Key Row
    translate([2,2.2])
      square([4.5,0.8]);
    r_len = connections[0] != "none" ? u_mm(0.5)-1 : 6;
    l_len = connections[1] != "none" ? u_mm(0.5)-1 : 6;
    translate([2,-r_len])
      square([0.8,r_len+l_len]);
    
    if(connections[0] != "none")
      translate([-1.3,1-u_mm(0.5)])
        square([4,0.8]);
    if(connections[1] != "none")
      translate([-1,u_mm(0.5)-1.4])
        square([3.8,0.8]);
    translate([7,2.5])
      circle(d=2.5,$fn=40);

    // Key Column
    translate([-3,0])
      circle(d=2.5,$fn=40);

    translate([7,-2.5])
      circle(d=2.5,$fn=40);
    translate([4.25,0]) {
      circle(d=2.5,$fn=40);
    }

    if(connections[3] == "hole"){
      translate([-5.5,2.5])
        circle(d=2.25, $fn=20);
      translate([-5.5,0])
        circle(d=2.25, $fn=20);
      translate([-5.5,-2.5])
        circle(d=2.25, $fn=20);
    }
    translate([-7.5,-2.5])
      circle(d=2.25, $fn=20);
    translate([-7.5,2.5])
      circle(d=2.25, $fn=20);
    translate([-7.5,0])
      circle(d=2.25, $fn=20);
  }
}

module ec11_pcb_outline() {
  square([u_mm(1), u_mm(1)]);
}

module ec11_space_outline() {
  translate([-0.5,-0.5, -6])
    cube([u_mm(1)+1, u_mm(1)+1, 8]);
  1u_centered() {
    translate([0,0,-15])
      linear_extrude(15)
        circle(d=7, $fn=30);
    translate([0,0,-25])
      linear_extrude(15)
        circle(d=19, $fn=80);
  }
}
// file: ../../../lib/switches/choc_v1.scad
include <../variables.scad>
include <stabilizers.scad>
include <footprints.scad>

module switch_choc_v1_pcb_drill(width=1, height=1) {
  half_width = u_mm(width)/2;
  half_height = u_mm(height)/2;
  translate([half_width,half_height,0]) {
    circle(d=3.5, $fn=30);

    translate([-5.5,0])
      circle(d=2, $fn=30);
    translate([3,3.8])
      circle(d=1, $fn=30);
    translate([-4, 3.8])
      circle(d=1, $fn=30);
    translate([-4,1.25-half_height])
      circle(d=1, $fn=30);
    translate([-4, half_height-3])
      circle(d=1, $fn=30);

    translate([5.5,0])
      circle(d=2, $fn=30);
    translate([0,5.9])
      circle(d=1.3, $fn=30);
    translate([5,3.8])
      circle(d=1.3, $fn=30);
    translate([1-half_width, half_height-1])
      circle(d=1, $fn=30);
    translate([half_width-1, half_height-1])
      circle(d=1, $fn=30);
  }
}

module switch_choc_v1_pcb_traces(width=1, height=1) {
  half_width = u_mm(width)/2;
  half_height = u_mm(height)/2;
  translate([half_width,half_height,0]) {
    translate([5,3.8])
      circle(d=2.8, $fn=30);
    translate([3,3.8])
      circle(d=2.5, $fn=30);
    translate([-4, 3.8])
      circle(d=2.5, $fn=30);
    translate([-4.5, 2-half_height])
      square([1, u_mm(height)-4]);
    translate([-4,1.25-half_height])
      circle(d=2.5, $fn=30);
    translate([-4, half_height-3])
      circle(d=2.5, $fn=30);

    translate([0,5.9])
      circle(d=2.8, $fn=30);
    translate([-0.5, 5.9])
      square([1, half_height-6.9]);
    translate([1-half_width, half_height-1.5])
      square([half_width*2-2, 1]);
    translate([1-half_width, half_height-1])
      circle(d=2.5, $fn=30);
    translate([half_width-1, half_height-1])
      circle(d=2.5, $fn=30);
  }
}

module switch_choc_v1_pcb_outline(width=1, height=1) {
  pcb_switch_outline(width=width, height=height);
}
// file: ../../../lib/switches/mx.scad
include <../variables.scad>
include <stabilizers.scad>
include <footprints.scad>
include <base.scad>
include <rgb.scad>

module switch_mx_pcb_drill(width=1, height=1, rgb=true, single=true, connections=["hole","hole","hole","hole"]) {
  half_width = u_mm(width)/2;
  half_height = u_mm(height)/2;
  translate([hole_offset(width), half_height]) {
    stab_holes(width);
  }

  switch_base_pcb_drill(width=width, height=height, single=single, rgb=rgb, connections=connections) {
    circle(d=4,$fn=40);
    translate([-3.8,-2.5,0])
      circle(d=1.7,$fn=40);
    translate([2.5,-5,0])
      circle(d=1.7,$fn=40);
    translate([5,0,0])
      circle(d=1.75,$fn=40);
    translate([-5,0,0])
      circle(d=1.75,$fn=40);

    // Column
    translate([-1.2,-3,0])
      circle(d=1,$fn=40);
    translate([5,-2,0])
      circle(d=1,$fn=40);
    if(single){
      translate([6,-3.7,0])
        circle(d=1,$fn=40);
      if(rgb) {
        translate([5,1.7,0])
          circle(d=1,$fn=40);
      } else {
        translate([6,-8.3,0])
          circle(d=1,$fn=40);
      }
    }
  }
}

module switch_mx_pcb_traces(width=1, height=1, rgb=true, single=true, xpos=0, ypos=0, connections=["hole","hole","hole","hole"], last_xpos=0, last_ypos=0) {
  half_width = u_mm(width)/2;
  half_height = u_mm(height)/2;
  switch_base_pcb_traces(width=width, height=height, rgb=rgb, xpos=xpos, ypos=ypos, connections=connections, last_xpos=last_xpos, last_ypos=last_ypos, single=single) {
    translate([-3.8,-2.5,0])
      circle(d=4,$fn=40);
    translate([2.5,-5,0])
      circle(d=4,$fn=40);

    // Row
    v_left = connections[3] == "none" ? 1 : half_width;
    v_right = connections[2] == "none" ? 1 : half_width-5;
    translate([1-v_left,-5.9,0])
      square([v_left+v_right+3,0.8]);

    // Column
    translate([-1.2,-3,0])
      circle(d=2.5,$fn=40);
    translate([5,-2,0])
      circle(d=2.5,$fn=40);
    if(single){
      translate([6,-3.7,0])
        circle(d=2.5,$fn=40);
      difference() {
        translate([5,0,0])
          circle(d=3.55,$fn=40);
        translate([5,-2,0])
          square(4);
      }
      if(rgb) {
        translate([5,1.7,0])
          circle(d=2.3,$fn=40);
      } else {
        translate([4.2,1])
          square([0.8, half_height-2]);
        translate([-1,half_height-1.5])
          square([6,0.8]);
        translate([6,-8.3,0])
          circle(d=2.5,$fn=40);
        translate([-1.3,-8.7,0])
          square([7,0.8]);
      }
    }
  }
}

module switch_mx_pcb_traces_bottom(width=1, height=1, rgb=true, xpos=0, ypos=0, connections=["hole","hole","hole","hole"], last_xpos=0, last_ypos=0) {
  half_width = u_mm(width)/2;
  half_height = u_mm(height)/2;
  switch_base_pcb_traces_bottom(width=width, height=height, rgb=rgb, xpos=xpos, ypos=ypos, connections=connections, last_xpos=last_xpos, last_ypos=last_ypos) {
    translate([-3.8,-2.5,0])
      circle(d=4,$fn=40);
    translate([2.5,-5,0])
      circle(d=4,$fn=40);

    // Column
    translate([-1.2,-3,0])
      circle(d=2.5,$fn=40);
    translate([5,-2,0])
      circle(d=2.5,$fn=40);
    difference(){
      translate([2.5,-5,0])
        circle(d=5.9,$fn=40);
      translate([2.5,-5,0])
        circle(d=4.1,$fn=40);
      translate([0.3,-7,0])
        rotate(45)
          square(6);
    }
    translate([3.85,-3.45])
      square([0.8, 1]);

    t_height = connections[0] == "none" ? 1 : half_height-7.8;
    echo("h", 2-half_height, t_height);
    translate([-1.3,-t_height-6.8])
      square([0.8, t_height]);
    translate([-1.3,-7.2])
      square([2.2,0.8]);
    difference() {
      translate([5,0,0])
        circle(d=3.35,$fn=40);
      translate([5,-2,0])
        square(4);
    }
    b_height = connections[1] == "none" ? 2 : half_height-2;
    translate([4.2,1])
      square([0.8, b_height]);
    if(connections[1] != "none")
      translate([-1,half_height-1.5])
        square([6,0.8]);
  }
}

module switch_mx_pcb_outline(width=1, height=1) {
  pcb_switch_outline(width=width, height=height);
}
// file: ../../../lib/utilities.scad
function reverse(list) = len(list) > 0 ? [for (i = [1:len(list)]) list[len(list)-i]] : [];
function pop(list) = len(list) > 0 ? [for (i = [0:len(list)-1]) if (i != 0) list[i]] : [];
// file: ../../../lib/switches.scad
use <utilities.scad>
include <switches/mx.scad>
include <switches/choc_v1.scad>

module rotate_translate(rotation, xpos, ypos) {
  if(rotation[0] == undef || rotation[0] == 0) {
    translate([u_mm(xpos), u_mm(ypos), 0]) {
      children();
    }
  } else {
    xoff = rotation[1] == undef ? 0 : rotation[1];
    yoff = rotation[2] == undef ? 0 : rotation[2];
    angle = rotation[0] == undef ? 0 : rotation[0];
    translate([u_mm(xpos - xoff), u_mm(ypos - yoff), 0])
      rotate(angle)
        translate([u_mm(xoff), u_mm(yoff), 0])
          children();
  }
}

module switch(type, style="mx", rgb=true, xpos=0, ypos=0, width=1, cnc=false, rotation=[0,0,0], connections=["hole","hole","hole","hole"], last_xpos=0, last_ypos=0) {
  rotate_translate(rotation, xpos, ypos) {
    if(type == "outline")
      pcb_switch_outline(width=width);
    if(style == "mx") {
      if(type == "key")
        pcb_switch_space_outline(width=width, cnc=cnc, style="mx");
      if(type == "traces")
        switch_mx_pcb_traces(width=width, rgb=rgb, xpos=xpos, ypos=ypos, connections=connections, last_xpos=last_xpos, last_ypos=last_ypos);
      if(type == "traces_top")
        switch_mx_pcb_traces(width=width, single=false, rgb=rgb, xpos=xpos, ypos=ypos, connections=connections, last_xpos=last_xpos, last_ypos=last_ypos);
      if(type == "traces_bottom")
        switch_mx_pcb_traces_bottom(width=width, rgb=rgb, xpos=xpos, ypos=ypos, connections=connections, last_xpos=last_xpos, last_ypos=last_ypos);
      if(type == "drill")
        switch_mx_pcb_drill(width=width, rgb=rgb, connections=connections);
      if(type == "drill_double")
        switch_mx_pcb_drill(width=width, single=false, rgb=rgb, connections=connections);
    }

    if(style == "choc_v1") {
      if(type == "key")
        pcb_switch_space_outline(width=width, cnc=cnc, style="choc_v1");
      if(type == "traces")
        switch_choc_v1_pcb_traces(width=width);
      if(type == "traces_top")
        switch_choc_v1_pcb_traces(width=width);
      if(type == "traces_bottom")
        assert(false, "traces_bottom is incompatible with choc_v1");
      if(type == "drill")
        switch_choc_v1_pcb_drill(width=width);
      if(type == "drill_double")
        switch_choc_v1_pcb_drill(width=width, single=false);
    }

    if(style == "redragon") {
      if(type == "key")
        pcb_switch_space_outline(width=width, cnc=cnc, style="redragon");
      if(type == "traces")
        switch_mx_pcb_traces(width=width, rgb=rgb);
      if(type == "traces_top")
        switch_mx_pcb_traces(width=width, single=false, rgb=rgb);
      if(type == "traces_bottom")
        switch_mx_pcb_traces_bottom(width=width, rgb=rgb);
      if(type == "traces")
        switch_mx_pcb_traces(width=width, rgb=rgb);
      if(type == "drill")
        switch_mx_pcb_drill(width=width);
      if(type == "drill_double")
        switch_mx_pcb_drill(width=width, single=false);
    }
  }
}

module switch_row(keys, style="mx", rgb=true, margin=5, thickness=10, depth=0, cnc=false, type="key", last_row=[], last_xpos=0, previous_xpos=0, last_ypos=0, previous_ypos=0) {
  width = keys[0][0] == undef ? 1 : keys[0][0];
  xpos = keys[0][1] == undef ? 0 : keys[0][1];
  ypos = keys[0][2] == undef ? 0 : keys[0][2];
  rotation = keys[0][3] == undef ? [0,0,0] : keys[0][3];
  connections = keys[0][4] == undef ? ["hole","hole","hole","hole"] : keys[0][4];
  last_ypos = last_row[0][2] == undef ? last_ypos - previous_ypos : last_row[0][2]+last_ypos - previous_ypos;
  last_xpos = last_row[0][1] == undef ? last_xpos - previous_xpos : last_row[0][1]+last_xpos - previous_xpos;
  switch(type, style=style, rgb=rgb, xpos=xpos, ypos=ypos, width=width, cnc=cnc, rotation=rotation, connections=connections, last_xpos=last_xpos, last_ypos=last_ypos);
  if(len(keys) > 1) {
    translate([xpos*key_size+width*key_size, ypos*key_size, 0])
      switch_row(pop(keys), style=style, rgb=rgb, margin=margin, thickness=thickness, depth=depth, cnc=cnc, type=type, last_row = pop(last_row), last_xpos=last_xpos, previous_xpos=xpos, last_ypos=last_ypos, previous_ypos=ypos);
  }
}

module switches(switches, style="mx", rgb=true, margin=5, thickness=10, depth=0, cnc=false, type="key", last_row=[]) {
  if(len(switches) != 0) {
    switch_row(switches[0], style=style, rgb=rgb, margin=margin, thickness=thickness, depth=depth, cnc=cnc, type=type, last_row=last_row);
    if(len(switches) > 1) {
      last_row = switches[0];
      translate([0, key_size, 0])
        switches(pop(switches), style=style, rgb=rgb, margin=margin, depth=depth, thickness=thickness, cnc=cnc, type=type, last_row=last_row);
    }
  }
}
// file: ../../../lib/case.scad
include <variables.scad>
use <utilities.scad>
use <circuits.scad>

function key_width(key) = (key[0] == undef ? 1 : key[0]) + (key[1] == undef ? 0 : key[1]);
function width_row(row) = len(row) == 0 ? 0 : key_width(row[0]) + width_row(pop(row));
function width_board(rows) = len(rows) == 0 ? 0 : (
  let (current = width_row(rows[0]))
  let (next = width_board(pop(rows)))
    current > next ? current : next);

function key_height(key) = (key[2] == undef ? 0 : key[2]);
function height_row(row) = len(row) == 0 ? [0,0] : (
  let(other_rows = height_row(pop(row)))
  let(current = key_height(row[0]) + other_rows[0])
  let(maximum = current > other_rows[1] ? current : other_rows[1])
  [current, maximum]);
function height_board_rec(rows) = len(rows) == 0 ? 0 : (
  let (current = height_row(reverse(rows[0]))[1])
  let (next = height_board_rec(pop(rows)))
    current > next ? current : next);
function height_board(rows) = 
  let (height_rec = height_board_rec(rows))
    len(rows) + (height_rec > 0 ? height_rec : 0);

module case(rows, style="mx", margin=5, thickness=5, depth=0, radius=2, rest=0, circuits=[], _inherit_children="unset") {
  total_thickness = thickness + depth + height_for_style(style);
  z_offset = depth + height_for_style(style);
  if($children != 0 && (_inherit_children == "unset" || _inherit_children > 0)) {
    translate([0, 0, -z_offset])
      linear_extrude(total_thickness)
        offset(margin)
          children();
  } else {
    width=u_mm(width_board(rows))+margin*2;
    height=u_mm(height_board(rows))+margin*2+rest;
    translate([-margin, -margin, -z_offset]){
      translate([radius, 0, 0])
        cube([width-radius*2, height,total_thickness]);
      translate([0, radius, 0])
        cube([width, height-radius*2,total_thickness]);
      translate([radius, radius, 0])
        cylinder(total_thickness,radius,radius, $fn=60);
      translate([width-radius, radius, 0])
        cylinder(total_thickness,radius,radius, $fn=60);
      translate([width-radius, height-radius, 0])
        cylinder(total_thickness,radius,radius, $fn=60);
      translate([radius, height-radius, 0])
        cylinder(total_thickness,radius,radius, $fn=60);
    }
    if(len(circuits) > 0)
      translate([0, 0, -z_offset])
        linear_extrude(total_thickness)
          offset(margin)
            circuits_pcb_outline(circuits);
  }
}
// file: ../../../lib/variables.scad
key_size=19.05;
hole=14;

function u_mm(u) = u*key_size;
function hole_offset(u) = (key_size-hole)/2+u_mm(u-1)/2;

// This is used to determine how much space is between the top
// of the plate and the PCB.
function height_for_style(style) = style == "mx"        ? 5.334 :
                                   style == "redragon" ? 3.75  :
                                   style == "choc_v1"   ? 2.2   :  "invalid style";
// file: base.scad
function circuit() = [[8,0,0,0,"pro_micro"],[9.1,0,0,0,"trrs_right"],];

function layout() = [
  [[6.26], [1,1,1,[20,1,2]]],
  [[2.25],[1.75],[1.25],[]]
];

module the_case() {
  translate([-u_mm(1), -u_mm(1)])
    square([u_mm(10), u_mm(5)]);
}

include <../../../keyboard.scad>
// main file
use <base.scad>

top_case(layout(), depth=8, thickness=30, circuits=circuit())
  the_case();
